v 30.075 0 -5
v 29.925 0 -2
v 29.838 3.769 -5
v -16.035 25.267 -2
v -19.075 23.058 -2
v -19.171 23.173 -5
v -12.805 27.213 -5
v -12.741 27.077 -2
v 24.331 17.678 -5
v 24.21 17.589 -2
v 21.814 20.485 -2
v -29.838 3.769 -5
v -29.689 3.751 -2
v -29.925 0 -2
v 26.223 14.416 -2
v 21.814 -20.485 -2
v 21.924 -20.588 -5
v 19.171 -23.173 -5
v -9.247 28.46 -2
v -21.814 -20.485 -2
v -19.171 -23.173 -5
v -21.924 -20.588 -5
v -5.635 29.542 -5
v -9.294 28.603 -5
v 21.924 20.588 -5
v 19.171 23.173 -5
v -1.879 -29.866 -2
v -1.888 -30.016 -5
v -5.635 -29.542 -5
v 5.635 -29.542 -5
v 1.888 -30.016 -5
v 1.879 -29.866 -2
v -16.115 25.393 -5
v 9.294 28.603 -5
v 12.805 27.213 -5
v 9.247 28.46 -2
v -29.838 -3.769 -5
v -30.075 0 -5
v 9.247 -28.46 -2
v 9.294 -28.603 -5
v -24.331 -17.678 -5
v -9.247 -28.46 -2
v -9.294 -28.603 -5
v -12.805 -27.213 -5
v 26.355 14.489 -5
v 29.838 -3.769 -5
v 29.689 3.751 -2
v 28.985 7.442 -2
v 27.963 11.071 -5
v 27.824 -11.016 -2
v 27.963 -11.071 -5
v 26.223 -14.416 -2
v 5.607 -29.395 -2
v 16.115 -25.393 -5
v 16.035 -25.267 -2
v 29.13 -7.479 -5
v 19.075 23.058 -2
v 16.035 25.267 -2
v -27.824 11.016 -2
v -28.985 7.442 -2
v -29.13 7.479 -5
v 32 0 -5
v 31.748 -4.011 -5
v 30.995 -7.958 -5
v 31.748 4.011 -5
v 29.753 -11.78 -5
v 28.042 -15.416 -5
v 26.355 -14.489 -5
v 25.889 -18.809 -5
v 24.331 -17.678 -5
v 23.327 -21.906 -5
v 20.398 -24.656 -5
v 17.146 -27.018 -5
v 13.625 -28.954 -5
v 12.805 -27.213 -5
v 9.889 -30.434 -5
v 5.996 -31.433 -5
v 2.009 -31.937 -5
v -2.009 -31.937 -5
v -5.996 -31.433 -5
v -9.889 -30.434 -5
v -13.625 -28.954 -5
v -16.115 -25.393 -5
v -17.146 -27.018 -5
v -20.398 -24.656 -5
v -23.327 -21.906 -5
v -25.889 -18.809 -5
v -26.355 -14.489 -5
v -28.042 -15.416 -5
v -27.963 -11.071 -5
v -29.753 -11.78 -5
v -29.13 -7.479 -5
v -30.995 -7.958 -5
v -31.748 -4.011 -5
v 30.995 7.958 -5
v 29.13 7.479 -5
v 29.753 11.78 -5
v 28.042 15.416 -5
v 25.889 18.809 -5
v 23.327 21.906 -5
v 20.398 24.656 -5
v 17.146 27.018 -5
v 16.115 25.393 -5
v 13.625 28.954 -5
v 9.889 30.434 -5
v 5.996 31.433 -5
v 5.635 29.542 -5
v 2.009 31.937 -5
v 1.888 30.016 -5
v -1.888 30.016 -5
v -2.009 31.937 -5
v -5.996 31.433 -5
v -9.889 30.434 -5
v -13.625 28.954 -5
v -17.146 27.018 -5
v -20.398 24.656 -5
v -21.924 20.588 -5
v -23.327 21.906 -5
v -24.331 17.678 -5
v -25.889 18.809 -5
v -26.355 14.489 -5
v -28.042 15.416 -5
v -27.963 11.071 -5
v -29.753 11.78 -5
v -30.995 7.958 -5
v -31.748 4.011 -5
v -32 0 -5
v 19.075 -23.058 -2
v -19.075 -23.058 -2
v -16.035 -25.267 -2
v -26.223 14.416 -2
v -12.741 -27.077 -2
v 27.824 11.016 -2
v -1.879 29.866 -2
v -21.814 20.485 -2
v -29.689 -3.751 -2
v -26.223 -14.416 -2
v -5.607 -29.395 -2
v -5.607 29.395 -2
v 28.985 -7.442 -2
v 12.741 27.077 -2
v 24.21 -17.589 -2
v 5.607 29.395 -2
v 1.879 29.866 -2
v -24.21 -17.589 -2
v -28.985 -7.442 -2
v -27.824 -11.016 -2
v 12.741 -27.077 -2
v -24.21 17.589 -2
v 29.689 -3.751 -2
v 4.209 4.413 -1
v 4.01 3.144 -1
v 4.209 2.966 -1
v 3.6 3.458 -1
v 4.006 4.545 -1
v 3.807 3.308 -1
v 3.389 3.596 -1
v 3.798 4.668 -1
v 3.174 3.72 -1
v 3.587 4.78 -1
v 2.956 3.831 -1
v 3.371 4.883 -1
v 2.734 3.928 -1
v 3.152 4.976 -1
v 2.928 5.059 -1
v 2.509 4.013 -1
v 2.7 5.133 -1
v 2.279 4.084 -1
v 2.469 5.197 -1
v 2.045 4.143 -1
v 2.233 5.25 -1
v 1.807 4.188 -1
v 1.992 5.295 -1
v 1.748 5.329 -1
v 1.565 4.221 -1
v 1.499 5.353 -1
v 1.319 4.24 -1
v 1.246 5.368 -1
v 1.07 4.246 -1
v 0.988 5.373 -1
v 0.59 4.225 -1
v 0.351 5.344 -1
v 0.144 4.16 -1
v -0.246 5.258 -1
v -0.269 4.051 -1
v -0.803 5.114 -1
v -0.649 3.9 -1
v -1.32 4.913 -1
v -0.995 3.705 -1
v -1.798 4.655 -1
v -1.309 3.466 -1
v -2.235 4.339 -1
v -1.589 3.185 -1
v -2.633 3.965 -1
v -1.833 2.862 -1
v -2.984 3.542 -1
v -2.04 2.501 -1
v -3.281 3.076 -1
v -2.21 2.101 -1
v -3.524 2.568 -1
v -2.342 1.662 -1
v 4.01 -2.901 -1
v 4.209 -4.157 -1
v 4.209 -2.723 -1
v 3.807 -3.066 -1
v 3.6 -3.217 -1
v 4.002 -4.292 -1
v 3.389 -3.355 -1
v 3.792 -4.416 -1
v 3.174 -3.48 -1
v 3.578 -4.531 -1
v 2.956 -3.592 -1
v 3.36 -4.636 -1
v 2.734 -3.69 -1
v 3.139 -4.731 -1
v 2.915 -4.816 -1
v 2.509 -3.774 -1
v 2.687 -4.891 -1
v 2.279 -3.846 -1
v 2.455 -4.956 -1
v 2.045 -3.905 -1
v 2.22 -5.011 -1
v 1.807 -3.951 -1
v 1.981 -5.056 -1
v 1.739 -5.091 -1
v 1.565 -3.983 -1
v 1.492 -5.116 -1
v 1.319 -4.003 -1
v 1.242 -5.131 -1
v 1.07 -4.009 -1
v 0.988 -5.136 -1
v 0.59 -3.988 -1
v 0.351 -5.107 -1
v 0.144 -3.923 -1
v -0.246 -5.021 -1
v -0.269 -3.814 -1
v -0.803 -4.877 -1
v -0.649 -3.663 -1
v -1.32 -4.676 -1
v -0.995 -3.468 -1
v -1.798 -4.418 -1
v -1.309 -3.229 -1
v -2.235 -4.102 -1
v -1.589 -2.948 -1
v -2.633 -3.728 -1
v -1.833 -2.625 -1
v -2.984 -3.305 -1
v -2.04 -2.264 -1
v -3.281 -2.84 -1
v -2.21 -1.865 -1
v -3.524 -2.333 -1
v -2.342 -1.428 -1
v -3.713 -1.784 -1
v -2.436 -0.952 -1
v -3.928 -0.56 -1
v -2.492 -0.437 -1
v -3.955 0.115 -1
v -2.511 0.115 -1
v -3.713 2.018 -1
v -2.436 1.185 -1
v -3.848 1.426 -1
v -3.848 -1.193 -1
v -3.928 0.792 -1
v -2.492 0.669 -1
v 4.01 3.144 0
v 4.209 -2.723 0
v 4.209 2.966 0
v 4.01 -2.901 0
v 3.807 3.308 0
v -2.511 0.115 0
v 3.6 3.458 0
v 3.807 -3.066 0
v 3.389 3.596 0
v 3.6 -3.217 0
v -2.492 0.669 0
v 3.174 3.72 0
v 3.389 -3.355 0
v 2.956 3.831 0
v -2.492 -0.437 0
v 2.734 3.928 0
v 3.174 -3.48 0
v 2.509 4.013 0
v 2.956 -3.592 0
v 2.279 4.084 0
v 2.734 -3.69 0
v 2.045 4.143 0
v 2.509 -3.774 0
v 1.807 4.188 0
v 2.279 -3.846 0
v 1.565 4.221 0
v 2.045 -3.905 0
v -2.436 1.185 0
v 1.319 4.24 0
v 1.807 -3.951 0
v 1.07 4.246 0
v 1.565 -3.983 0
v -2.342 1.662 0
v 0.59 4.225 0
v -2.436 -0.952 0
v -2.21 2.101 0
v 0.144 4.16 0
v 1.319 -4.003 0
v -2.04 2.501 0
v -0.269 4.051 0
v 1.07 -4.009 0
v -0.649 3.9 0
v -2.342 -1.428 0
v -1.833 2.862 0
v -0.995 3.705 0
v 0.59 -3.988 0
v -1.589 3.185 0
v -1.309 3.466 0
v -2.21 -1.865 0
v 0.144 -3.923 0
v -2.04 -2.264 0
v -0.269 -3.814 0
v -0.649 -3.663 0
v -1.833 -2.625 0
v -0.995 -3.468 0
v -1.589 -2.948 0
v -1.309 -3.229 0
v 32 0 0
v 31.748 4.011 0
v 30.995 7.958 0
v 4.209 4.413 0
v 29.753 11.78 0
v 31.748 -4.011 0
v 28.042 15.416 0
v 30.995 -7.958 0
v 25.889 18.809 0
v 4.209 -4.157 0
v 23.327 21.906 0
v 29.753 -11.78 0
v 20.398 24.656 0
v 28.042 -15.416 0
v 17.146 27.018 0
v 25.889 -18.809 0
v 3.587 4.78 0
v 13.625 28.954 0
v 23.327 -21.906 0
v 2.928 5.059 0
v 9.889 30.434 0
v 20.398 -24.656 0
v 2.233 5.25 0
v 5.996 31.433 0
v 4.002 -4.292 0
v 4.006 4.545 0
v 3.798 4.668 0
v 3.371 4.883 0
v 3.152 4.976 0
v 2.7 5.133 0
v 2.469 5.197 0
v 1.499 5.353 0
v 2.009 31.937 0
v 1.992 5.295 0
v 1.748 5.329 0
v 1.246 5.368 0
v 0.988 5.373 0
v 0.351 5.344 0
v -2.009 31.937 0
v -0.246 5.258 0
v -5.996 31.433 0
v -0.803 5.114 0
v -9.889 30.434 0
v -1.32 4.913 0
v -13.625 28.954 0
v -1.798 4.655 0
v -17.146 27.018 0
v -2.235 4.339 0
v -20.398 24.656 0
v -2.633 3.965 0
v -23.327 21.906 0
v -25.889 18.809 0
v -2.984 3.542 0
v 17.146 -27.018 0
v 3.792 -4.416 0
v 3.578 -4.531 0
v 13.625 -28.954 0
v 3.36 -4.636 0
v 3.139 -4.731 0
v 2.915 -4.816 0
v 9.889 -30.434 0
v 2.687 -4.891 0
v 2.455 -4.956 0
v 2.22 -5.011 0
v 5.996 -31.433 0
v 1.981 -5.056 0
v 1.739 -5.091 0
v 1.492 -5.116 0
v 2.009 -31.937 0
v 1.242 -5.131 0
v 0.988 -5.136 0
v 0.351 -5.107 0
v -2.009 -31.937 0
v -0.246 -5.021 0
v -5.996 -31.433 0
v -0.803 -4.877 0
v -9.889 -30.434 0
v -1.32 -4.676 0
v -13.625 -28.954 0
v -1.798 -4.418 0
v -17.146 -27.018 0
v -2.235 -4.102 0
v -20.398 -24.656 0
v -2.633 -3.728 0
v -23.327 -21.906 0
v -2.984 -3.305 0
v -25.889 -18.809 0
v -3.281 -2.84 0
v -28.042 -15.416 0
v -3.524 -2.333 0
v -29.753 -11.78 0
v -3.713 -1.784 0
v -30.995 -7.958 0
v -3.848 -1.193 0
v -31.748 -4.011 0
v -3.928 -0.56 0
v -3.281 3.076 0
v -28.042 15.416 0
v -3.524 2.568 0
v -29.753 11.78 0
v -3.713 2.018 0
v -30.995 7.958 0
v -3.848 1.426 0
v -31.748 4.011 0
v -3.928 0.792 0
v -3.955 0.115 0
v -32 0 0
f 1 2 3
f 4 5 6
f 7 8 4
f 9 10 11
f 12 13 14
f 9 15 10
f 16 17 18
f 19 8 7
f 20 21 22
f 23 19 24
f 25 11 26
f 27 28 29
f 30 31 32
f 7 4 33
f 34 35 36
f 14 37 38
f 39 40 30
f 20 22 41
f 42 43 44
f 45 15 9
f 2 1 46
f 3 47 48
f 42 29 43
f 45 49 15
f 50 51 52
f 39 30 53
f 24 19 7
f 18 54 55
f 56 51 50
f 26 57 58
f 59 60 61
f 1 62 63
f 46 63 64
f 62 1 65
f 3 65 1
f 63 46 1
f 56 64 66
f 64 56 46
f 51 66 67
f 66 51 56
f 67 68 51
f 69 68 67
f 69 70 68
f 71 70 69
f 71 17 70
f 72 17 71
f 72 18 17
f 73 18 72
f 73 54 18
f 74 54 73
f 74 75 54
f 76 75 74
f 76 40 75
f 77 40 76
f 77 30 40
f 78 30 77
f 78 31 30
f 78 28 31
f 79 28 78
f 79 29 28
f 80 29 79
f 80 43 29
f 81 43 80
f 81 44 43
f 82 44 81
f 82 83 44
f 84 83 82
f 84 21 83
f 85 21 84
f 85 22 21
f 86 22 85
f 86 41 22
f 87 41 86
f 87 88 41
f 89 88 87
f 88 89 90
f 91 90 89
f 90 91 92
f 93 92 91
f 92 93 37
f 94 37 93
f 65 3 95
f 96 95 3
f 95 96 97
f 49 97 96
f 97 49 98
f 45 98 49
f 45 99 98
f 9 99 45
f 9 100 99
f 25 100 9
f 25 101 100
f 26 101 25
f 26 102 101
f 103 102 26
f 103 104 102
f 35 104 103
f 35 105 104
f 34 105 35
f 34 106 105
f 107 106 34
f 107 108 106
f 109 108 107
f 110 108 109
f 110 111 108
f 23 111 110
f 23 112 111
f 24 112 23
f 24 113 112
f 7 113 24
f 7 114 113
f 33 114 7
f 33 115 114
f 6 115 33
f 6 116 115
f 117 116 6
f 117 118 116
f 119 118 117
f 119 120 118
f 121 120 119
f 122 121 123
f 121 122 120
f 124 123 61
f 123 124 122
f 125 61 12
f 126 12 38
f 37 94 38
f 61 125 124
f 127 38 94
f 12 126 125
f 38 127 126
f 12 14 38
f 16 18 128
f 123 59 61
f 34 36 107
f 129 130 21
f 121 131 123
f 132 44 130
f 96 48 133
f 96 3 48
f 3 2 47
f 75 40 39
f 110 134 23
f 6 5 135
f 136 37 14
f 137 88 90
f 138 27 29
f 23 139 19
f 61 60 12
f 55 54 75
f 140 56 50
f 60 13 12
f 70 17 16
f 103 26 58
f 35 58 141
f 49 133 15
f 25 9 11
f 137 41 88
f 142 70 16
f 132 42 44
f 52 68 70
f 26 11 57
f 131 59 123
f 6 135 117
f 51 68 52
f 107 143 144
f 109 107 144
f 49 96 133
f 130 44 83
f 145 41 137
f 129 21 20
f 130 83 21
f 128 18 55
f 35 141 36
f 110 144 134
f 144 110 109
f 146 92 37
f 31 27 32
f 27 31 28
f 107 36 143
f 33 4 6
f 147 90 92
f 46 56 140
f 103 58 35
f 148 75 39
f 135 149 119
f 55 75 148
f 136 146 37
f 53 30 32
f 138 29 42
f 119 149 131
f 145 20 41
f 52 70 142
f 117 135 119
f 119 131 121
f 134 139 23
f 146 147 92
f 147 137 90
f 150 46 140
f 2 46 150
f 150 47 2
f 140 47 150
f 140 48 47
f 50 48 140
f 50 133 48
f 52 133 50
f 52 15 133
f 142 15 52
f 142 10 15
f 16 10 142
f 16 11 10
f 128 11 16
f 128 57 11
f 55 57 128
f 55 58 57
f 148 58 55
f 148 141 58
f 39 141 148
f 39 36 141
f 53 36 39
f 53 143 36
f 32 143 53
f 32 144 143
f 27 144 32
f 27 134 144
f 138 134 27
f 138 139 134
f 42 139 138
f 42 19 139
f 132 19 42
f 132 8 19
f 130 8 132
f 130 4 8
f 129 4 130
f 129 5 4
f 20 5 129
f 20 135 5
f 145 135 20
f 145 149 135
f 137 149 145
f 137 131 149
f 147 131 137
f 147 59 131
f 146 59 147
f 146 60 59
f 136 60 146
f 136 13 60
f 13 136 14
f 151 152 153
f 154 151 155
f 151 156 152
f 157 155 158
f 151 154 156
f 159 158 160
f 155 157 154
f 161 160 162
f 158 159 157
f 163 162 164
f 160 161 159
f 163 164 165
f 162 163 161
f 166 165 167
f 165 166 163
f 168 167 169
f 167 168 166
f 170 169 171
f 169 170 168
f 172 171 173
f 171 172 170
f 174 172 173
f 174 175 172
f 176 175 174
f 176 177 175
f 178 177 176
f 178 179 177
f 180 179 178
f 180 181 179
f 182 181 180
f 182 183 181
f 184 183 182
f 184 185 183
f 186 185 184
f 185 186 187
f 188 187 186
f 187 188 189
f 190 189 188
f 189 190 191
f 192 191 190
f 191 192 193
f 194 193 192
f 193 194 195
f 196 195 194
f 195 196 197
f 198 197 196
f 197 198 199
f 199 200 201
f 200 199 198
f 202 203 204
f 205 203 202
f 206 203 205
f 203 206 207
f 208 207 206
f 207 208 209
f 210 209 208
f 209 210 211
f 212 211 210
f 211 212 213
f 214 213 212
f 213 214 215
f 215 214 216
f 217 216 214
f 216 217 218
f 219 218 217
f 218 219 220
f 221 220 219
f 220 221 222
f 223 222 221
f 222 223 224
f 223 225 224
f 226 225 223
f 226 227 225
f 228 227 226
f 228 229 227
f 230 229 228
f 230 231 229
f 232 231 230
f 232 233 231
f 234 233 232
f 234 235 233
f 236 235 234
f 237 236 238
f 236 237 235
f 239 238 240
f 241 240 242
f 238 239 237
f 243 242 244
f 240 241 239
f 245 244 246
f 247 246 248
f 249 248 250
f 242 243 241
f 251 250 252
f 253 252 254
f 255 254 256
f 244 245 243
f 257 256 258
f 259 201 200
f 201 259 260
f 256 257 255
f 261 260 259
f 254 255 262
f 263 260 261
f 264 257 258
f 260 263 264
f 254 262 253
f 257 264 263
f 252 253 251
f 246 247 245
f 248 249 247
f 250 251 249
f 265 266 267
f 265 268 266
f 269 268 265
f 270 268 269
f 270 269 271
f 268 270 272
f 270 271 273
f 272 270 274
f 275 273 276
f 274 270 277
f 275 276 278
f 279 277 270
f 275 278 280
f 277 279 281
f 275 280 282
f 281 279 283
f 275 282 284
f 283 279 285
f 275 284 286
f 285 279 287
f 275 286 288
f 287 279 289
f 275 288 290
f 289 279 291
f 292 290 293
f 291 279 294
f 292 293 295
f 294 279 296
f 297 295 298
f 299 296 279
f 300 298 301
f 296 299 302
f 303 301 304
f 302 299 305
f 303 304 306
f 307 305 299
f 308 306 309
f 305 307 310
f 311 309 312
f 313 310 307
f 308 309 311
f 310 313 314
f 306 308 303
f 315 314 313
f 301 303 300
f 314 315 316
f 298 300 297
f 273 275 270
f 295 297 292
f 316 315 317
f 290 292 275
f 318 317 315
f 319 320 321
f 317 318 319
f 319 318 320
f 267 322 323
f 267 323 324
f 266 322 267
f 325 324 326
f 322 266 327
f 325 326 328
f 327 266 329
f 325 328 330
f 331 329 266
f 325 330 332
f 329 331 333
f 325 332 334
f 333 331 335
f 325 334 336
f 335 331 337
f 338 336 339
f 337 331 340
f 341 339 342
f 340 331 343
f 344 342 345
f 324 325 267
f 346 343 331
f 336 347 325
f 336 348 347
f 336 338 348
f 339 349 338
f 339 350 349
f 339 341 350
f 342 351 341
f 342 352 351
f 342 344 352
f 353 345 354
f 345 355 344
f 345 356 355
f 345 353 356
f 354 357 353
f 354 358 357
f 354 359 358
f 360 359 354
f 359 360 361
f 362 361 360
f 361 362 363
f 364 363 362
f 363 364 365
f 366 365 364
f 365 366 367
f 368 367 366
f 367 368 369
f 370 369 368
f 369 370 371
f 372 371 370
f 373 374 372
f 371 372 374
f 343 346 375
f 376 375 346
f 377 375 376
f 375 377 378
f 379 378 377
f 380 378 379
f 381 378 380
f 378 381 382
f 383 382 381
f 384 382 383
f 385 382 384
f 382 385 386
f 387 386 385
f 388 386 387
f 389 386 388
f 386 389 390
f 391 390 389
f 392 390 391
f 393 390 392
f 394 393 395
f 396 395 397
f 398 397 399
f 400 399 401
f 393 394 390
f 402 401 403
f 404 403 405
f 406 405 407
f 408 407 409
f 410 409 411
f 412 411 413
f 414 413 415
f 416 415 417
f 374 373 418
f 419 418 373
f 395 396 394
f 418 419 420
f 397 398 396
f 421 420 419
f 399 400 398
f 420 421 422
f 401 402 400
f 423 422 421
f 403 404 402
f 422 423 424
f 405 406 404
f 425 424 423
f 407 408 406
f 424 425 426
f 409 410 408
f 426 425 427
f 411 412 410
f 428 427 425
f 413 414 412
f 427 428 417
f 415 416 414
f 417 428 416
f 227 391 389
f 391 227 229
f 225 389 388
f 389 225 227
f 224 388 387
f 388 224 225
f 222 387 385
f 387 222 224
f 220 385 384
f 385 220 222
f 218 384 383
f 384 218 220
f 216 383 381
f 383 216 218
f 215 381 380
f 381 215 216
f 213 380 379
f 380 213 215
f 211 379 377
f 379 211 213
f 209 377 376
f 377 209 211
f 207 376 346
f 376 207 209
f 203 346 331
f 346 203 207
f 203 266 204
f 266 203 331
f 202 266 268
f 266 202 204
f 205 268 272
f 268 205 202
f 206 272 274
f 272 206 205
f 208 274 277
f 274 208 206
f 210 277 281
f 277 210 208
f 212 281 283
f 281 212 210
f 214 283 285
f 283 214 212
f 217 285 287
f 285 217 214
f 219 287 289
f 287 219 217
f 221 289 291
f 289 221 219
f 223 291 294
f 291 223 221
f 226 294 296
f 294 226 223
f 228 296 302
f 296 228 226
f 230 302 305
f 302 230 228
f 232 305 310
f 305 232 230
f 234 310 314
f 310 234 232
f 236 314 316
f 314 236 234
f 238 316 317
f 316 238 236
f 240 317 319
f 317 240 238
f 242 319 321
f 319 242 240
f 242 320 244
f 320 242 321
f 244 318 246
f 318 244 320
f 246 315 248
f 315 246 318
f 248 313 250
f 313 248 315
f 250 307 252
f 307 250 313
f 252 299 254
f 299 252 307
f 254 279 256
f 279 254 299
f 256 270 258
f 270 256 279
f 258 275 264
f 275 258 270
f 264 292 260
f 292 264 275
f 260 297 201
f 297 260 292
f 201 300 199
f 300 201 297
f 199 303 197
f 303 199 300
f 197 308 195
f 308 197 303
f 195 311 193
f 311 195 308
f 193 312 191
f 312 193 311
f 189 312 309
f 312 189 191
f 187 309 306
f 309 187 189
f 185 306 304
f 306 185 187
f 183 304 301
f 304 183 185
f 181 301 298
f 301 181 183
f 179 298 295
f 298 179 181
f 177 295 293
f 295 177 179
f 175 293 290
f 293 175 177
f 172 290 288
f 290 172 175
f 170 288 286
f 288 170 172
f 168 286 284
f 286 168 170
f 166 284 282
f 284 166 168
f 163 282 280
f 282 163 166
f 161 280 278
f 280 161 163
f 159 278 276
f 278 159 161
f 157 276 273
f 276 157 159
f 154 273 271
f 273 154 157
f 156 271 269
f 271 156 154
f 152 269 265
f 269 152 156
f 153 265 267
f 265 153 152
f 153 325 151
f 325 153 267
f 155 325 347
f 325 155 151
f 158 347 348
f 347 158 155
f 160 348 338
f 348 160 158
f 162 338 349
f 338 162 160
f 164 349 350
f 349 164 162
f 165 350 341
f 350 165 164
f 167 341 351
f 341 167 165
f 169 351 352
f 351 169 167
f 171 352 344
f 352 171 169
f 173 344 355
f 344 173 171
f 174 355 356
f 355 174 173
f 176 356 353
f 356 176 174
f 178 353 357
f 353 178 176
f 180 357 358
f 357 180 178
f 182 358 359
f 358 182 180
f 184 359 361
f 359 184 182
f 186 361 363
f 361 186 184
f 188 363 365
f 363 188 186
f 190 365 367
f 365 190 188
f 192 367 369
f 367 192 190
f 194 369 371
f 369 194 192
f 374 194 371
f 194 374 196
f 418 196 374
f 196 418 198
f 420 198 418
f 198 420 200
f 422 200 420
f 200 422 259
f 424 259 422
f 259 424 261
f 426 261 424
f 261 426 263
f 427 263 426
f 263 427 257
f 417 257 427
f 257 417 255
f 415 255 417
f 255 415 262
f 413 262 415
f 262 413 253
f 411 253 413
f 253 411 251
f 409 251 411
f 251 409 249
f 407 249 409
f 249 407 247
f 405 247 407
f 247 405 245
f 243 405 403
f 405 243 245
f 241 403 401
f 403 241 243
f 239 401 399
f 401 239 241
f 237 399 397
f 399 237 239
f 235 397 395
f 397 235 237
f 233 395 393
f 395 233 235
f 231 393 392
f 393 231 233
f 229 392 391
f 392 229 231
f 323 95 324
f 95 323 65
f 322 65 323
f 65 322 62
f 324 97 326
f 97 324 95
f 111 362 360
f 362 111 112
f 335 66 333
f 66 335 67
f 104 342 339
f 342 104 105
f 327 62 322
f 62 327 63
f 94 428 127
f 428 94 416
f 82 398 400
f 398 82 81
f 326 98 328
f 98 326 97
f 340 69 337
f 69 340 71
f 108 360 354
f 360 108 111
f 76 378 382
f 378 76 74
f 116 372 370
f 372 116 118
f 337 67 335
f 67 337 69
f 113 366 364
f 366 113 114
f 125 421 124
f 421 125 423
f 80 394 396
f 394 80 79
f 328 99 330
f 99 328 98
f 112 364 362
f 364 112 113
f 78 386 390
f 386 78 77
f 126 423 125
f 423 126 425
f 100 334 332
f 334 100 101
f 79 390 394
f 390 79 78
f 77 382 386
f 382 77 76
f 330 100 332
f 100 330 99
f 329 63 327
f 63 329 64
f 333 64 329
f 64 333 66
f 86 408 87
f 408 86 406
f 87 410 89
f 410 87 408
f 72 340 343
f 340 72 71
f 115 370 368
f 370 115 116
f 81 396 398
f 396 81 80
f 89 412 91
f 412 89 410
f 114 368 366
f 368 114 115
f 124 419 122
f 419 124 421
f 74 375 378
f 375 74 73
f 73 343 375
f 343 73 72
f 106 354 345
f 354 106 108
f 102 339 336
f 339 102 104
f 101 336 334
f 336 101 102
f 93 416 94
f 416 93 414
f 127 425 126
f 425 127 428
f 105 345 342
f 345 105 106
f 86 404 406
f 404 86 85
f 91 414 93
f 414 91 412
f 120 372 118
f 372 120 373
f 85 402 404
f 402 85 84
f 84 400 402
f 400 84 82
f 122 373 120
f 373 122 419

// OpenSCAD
$fn = 50;

difference() {
	union() {
		translate(v = [0, 0, -5.0]) {
			cylinder(h = 5, r = 32.0);
		}
	}
	union() {
		#translate(v = [0, 0, -5.0]) {
			cylinder(h = 3, r1 = 30.075, r2 = 29.925);
		}
		translate(v = [0, 0, -1]) {
			linear_extrude(height = 1) {
				text(font = "Impact", halign = "center", size = 10, text = "C", valign = "center");
			}
		}
	}
}
